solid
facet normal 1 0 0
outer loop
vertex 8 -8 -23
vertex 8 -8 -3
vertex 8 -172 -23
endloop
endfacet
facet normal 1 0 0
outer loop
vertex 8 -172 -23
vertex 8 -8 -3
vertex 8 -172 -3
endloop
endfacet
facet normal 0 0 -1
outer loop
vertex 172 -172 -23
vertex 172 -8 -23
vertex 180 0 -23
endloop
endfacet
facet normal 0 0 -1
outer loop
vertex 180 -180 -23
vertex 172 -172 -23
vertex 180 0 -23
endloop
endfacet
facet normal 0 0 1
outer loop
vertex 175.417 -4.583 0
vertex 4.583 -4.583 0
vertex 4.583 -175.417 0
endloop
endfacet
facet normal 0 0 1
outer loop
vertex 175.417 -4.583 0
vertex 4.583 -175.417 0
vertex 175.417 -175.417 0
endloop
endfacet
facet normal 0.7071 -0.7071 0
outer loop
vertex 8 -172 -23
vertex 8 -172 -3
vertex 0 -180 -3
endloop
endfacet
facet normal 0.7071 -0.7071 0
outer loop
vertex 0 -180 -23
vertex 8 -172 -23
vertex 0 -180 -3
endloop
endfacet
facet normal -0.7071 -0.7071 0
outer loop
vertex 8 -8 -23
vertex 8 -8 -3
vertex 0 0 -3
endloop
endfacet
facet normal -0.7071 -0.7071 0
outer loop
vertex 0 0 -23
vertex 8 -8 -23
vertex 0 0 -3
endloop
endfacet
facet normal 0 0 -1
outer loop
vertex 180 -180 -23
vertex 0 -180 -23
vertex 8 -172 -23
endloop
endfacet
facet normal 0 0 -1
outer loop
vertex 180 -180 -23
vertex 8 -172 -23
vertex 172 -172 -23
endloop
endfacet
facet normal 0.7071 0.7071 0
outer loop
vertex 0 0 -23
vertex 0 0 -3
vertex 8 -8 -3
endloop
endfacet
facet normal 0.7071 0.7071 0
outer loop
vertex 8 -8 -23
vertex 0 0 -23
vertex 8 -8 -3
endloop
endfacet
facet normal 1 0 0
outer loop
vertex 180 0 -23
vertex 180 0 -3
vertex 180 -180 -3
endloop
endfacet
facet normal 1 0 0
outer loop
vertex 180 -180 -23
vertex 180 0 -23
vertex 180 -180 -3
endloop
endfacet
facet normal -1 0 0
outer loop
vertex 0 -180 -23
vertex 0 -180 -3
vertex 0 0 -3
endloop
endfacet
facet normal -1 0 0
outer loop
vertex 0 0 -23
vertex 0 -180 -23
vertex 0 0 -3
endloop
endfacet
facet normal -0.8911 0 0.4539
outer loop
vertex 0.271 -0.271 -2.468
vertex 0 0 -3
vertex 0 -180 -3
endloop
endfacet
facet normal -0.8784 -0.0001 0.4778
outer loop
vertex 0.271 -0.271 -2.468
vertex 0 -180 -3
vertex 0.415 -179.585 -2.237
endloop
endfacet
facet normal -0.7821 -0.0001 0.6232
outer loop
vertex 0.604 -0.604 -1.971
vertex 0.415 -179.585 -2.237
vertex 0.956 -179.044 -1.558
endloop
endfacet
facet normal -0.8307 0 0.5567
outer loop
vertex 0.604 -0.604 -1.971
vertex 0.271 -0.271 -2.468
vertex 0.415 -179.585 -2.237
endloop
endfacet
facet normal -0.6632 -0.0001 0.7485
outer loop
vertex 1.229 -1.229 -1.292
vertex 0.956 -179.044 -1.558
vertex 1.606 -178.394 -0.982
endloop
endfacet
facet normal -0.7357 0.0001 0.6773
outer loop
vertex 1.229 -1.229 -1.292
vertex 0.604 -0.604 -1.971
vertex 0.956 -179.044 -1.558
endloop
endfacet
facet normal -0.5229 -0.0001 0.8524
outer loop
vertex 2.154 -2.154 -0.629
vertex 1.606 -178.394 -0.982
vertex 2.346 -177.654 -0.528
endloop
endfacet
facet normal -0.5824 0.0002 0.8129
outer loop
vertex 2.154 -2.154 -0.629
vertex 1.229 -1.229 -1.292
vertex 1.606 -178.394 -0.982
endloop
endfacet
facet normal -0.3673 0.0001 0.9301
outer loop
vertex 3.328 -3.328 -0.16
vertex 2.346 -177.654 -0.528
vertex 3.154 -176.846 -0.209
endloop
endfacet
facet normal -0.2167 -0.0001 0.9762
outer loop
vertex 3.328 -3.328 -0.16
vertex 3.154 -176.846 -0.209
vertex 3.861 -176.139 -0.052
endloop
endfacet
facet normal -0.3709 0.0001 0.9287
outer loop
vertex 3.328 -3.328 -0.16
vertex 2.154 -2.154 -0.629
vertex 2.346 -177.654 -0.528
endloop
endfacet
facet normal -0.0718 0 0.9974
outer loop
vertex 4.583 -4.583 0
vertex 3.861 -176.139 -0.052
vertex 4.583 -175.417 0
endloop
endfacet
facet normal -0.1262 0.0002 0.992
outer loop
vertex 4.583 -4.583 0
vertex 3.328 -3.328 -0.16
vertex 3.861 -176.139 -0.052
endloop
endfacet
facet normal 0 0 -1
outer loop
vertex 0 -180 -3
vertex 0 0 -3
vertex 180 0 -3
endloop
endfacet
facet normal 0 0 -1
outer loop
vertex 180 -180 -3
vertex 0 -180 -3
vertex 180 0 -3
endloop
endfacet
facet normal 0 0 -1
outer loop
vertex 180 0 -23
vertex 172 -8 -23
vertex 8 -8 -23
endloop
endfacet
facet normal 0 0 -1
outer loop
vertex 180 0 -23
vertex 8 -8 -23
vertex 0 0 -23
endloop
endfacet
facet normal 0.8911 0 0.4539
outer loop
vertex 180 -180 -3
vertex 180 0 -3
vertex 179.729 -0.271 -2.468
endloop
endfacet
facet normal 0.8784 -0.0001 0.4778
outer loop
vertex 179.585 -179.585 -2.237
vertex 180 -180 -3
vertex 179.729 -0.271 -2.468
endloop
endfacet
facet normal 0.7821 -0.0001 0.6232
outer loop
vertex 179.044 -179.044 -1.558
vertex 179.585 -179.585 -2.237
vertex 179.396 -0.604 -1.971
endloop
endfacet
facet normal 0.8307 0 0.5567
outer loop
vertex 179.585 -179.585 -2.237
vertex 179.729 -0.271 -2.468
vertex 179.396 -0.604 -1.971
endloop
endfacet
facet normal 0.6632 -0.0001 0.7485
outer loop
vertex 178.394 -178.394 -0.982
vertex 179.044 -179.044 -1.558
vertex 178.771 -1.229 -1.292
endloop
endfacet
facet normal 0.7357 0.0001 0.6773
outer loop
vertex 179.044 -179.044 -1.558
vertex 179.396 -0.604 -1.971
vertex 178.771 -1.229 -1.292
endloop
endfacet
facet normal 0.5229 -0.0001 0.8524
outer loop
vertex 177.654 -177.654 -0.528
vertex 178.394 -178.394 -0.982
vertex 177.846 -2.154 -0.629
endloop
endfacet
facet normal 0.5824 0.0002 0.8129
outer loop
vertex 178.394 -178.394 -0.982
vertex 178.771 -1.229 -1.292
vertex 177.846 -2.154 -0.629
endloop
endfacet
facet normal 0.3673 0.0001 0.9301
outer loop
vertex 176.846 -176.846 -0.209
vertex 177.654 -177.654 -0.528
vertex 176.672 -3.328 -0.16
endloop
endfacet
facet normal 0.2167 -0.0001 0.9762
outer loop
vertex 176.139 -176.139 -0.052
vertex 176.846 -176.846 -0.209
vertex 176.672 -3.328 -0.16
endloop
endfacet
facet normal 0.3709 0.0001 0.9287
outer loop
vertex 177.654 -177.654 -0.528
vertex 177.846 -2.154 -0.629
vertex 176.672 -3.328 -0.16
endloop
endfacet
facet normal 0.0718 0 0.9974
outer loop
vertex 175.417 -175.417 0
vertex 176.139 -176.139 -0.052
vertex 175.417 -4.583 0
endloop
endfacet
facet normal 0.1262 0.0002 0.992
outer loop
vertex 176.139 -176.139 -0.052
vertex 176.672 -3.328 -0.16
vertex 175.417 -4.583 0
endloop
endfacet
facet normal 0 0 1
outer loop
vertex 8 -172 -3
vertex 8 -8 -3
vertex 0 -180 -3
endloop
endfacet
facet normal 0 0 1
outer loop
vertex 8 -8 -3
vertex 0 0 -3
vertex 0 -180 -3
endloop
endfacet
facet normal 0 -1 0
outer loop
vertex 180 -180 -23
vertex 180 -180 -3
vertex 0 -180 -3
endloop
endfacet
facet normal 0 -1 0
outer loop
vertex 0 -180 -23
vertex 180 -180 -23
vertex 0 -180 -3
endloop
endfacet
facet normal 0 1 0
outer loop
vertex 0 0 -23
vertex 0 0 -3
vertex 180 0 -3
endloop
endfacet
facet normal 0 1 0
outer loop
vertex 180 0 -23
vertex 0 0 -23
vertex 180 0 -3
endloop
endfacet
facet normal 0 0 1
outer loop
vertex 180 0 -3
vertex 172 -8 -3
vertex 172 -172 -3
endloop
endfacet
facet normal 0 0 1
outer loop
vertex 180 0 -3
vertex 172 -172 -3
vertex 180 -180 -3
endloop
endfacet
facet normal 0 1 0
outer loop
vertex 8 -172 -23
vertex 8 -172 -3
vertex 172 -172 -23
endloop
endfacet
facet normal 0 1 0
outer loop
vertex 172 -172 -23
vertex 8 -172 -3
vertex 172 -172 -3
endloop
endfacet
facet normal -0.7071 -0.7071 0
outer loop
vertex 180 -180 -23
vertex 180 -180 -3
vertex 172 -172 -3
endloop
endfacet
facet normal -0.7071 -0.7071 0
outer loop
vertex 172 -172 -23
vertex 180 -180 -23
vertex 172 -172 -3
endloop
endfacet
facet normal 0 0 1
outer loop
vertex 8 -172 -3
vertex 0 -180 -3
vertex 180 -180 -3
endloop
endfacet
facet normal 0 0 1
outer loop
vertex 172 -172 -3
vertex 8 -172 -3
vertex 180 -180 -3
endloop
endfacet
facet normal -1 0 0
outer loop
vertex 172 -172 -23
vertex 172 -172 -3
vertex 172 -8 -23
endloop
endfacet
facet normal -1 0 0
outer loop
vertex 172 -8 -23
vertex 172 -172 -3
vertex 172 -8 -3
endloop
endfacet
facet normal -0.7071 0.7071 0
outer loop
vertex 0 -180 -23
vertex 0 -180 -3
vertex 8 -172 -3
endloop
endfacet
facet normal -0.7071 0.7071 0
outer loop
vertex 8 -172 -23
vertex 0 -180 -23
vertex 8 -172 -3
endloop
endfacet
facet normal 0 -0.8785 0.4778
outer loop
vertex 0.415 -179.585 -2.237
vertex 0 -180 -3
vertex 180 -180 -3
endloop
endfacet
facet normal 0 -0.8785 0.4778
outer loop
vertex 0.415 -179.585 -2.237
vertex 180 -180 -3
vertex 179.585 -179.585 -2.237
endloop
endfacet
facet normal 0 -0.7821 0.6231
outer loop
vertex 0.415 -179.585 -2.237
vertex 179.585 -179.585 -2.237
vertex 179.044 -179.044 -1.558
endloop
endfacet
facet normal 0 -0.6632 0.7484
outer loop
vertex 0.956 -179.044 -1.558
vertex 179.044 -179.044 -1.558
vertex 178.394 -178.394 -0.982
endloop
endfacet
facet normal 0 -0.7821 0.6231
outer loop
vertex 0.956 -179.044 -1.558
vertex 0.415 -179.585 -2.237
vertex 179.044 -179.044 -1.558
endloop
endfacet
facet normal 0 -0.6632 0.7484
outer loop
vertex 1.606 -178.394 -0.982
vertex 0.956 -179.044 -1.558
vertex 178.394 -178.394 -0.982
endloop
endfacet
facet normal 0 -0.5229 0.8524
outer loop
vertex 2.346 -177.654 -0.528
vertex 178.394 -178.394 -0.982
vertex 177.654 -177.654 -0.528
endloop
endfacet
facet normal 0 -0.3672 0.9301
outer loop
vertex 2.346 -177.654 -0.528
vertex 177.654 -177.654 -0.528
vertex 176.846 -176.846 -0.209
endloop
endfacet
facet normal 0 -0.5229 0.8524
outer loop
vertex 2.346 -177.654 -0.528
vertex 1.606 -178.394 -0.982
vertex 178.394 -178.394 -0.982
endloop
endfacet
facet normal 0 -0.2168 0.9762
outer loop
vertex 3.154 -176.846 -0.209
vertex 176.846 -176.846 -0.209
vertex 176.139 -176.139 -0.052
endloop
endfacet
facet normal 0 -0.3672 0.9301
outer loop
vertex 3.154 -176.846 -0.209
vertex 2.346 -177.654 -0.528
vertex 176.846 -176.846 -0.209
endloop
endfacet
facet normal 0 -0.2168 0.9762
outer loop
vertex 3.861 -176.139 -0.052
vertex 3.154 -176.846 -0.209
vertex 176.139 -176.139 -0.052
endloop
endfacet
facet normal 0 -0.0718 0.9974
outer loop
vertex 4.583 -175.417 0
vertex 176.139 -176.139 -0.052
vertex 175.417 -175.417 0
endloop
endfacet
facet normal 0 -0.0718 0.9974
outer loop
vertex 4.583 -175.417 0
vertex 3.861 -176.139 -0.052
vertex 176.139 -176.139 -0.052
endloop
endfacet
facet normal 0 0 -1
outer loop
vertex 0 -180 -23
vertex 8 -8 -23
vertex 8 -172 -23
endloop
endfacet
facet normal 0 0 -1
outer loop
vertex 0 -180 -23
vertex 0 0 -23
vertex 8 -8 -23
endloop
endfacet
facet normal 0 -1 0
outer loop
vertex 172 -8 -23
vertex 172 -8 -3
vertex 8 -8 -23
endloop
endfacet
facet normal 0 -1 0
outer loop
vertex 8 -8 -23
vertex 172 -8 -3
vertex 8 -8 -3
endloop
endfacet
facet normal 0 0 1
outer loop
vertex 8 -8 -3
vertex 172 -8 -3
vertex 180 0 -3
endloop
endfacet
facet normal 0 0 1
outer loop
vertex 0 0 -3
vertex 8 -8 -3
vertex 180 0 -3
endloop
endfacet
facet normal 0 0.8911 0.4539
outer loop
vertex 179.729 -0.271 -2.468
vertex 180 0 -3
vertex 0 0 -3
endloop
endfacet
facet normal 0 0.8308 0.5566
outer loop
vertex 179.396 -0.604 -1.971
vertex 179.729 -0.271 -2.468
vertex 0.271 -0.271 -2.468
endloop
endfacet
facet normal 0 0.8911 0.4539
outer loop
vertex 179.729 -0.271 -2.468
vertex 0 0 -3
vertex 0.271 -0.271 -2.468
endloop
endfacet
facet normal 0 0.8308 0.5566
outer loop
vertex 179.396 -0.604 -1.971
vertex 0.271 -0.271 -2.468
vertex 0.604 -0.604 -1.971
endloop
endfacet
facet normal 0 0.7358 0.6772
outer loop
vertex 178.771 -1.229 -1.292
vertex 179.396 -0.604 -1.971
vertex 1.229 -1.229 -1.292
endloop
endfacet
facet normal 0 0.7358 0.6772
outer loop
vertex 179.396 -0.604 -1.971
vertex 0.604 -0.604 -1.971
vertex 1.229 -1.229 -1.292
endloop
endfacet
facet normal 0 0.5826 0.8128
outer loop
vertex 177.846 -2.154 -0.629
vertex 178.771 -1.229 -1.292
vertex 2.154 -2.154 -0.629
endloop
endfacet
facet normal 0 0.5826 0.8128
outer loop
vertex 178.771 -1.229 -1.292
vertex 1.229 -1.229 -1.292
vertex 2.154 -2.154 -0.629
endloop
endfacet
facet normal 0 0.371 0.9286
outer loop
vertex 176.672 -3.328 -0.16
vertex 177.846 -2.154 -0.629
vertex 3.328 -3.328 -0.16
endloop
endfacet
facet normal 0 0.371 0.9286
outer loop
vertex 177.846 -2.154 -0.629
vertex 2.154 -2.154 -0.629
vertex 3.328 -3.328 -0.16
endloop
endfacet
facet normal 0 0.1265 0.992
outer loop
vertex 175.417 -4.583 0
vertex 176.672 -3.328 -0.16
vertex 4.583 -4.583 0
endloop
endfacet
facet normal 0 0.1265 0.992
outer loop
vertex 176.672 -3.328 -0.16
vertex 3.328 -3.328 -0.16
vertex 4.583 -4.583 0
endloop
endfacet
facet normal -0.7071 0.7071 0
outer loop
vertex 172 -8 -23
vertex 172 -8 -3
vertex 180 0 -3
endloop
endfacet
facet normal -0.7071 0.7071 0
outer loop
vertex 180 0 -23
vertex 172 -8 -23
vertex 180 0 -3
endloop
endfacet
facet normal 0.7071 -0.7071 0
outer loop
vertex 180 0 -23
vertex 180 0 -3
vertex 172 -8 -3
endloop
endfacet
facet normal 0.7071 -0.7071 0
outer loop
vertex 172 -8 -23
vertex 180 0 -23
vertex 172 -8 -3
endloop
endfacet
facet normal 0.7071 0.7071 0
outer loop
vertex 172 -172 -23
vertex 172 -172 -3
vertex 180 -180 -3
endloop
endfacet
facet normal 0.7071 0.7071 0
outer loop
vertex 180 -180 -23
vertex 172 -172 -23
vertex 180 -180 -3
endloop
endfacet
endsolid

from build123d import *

# Parameters (mm, degrees)
F0_W        = 180
F0_H        = 180
F1_DEPTH    = 3
F3_DEPTH    = 20
F4_DEPTH    = 20
F5_DEPTH    = 20
F6_DEPTH    = 20
F7_T1_DEPTH = 202.9128784748
F7_T3_DEPTH = 202.9128784748


# Not quite as in the source:
# - a fillet or chamfer that OpenCascade refuses, or shapes differently, is made with other operations: its cross-section is extruded or revolved along the edge and cut away or added


with BuildPart() as f1:
    # F0 (on Top) → F1 (new body)
    with BuildSketch(Plane.XY):
        with Locations((90, -90)):
            Rectangle(F0_W, F0_H)
    extrude(amount=-F1_DEPTH)

    # F7: fillet of radius 5 on 4 edges, made by hand

    # F7_s2 → F7_t1 (cut)
    with BuildSketch(Plane.YZ.offset(-11.4564392374)):
        with BuildLine():
            ThreePointArc((-180, -3), (-178.1560370926, -0.8166998673), (-175.417424305, 0))
            Line((-175.417424305, 0), (-180, 0))
            Line((-180, 0), (-180, -3))
        make_face()
        with BuildLine():
            ThreePointArc((0, -3), (-1.8439629074, -0.8166998673), (-4.582575695, 0))
            Line((-4.582575695, 0), (0, 0))
            Line((0, 0), (0, -3))
        make_face()
    extrude(amount=F7_T1_DEPTH, mode=Mode.SUBTRACT)

    # F7_s4 → F7_t3 (cut)
    with BuildSketch(Plane.XZ.offset(-11.4564392374)):
        with BuildLine():
            ThreePointArc((180, -3), (178.1560370926, -0.8166998673), (175.417424305, 0))
            Line((175.417424305, 0), (180, 0))
            Line((180, 0), (180, -3))
        make_face()
        with BuildLine():
            ThreePointArc((0, -3), (1.8439629074, -0.8166998673), (4.582575695, 0))
            Line((4.582575695, 0), (0, 0))
            Line((0, 0), (0, -3))
        make_face()
    extrude(amount=F7_T3_DEPTH, mode=Mode.SUBTRACT)


with BuildPart() as f3:
    # F2 (on face) → F3 (new body)
    with BuildSketch(Plane(origin=(0, 0, -3), x_dir=(1, 0, 0), z_dir=(0, 0, -1))):
        Polygon((0, 180), (8, 172), (172, 172), (180, 180), align=None)
    extrude(amount=F3_DEPTH)


with BuildPart() as f4:
    # F2 (on face) → F4 (new body, through all)
    with BuildSketch(Plane(origin=(0, 0, -3), x_dir=(1, 0, 0), z_dir=(0, 0, -1))):
        Polygon((8, 8), (8, 172), (0, 180), (0, 0), align=None)
    extrude(amount=F4_DEPTH)


with BuildPart() as f5:
    # F2 (on face) → F5 (new body, through all)
    with BuildSketch(Plane(origin=(0, 0, -3), x_dir=(1, 0, 0), z_dir=(0, 0, -1))):
        Polygon((180, 180), (172, 172), (172, 8), (180, 0), align=None)
    extrude(amount=F5_DEPTH)


with BuildPart() as f6:
    # F2 (on face) → F6 (new body, through all)
    with BuildSketch(Plane(origin=(0, 0, -3), x_dir=(1, 0, 0), z_dir=(0, 0, -1))):
        Polygon((172, 8), (8, 8), (0, 0), (180, 0), align=None)
    extrude(amount=F6_DEPTH)


solid = Compound([f1.part, f3.part, f4.part, f5.part, f6.part])
